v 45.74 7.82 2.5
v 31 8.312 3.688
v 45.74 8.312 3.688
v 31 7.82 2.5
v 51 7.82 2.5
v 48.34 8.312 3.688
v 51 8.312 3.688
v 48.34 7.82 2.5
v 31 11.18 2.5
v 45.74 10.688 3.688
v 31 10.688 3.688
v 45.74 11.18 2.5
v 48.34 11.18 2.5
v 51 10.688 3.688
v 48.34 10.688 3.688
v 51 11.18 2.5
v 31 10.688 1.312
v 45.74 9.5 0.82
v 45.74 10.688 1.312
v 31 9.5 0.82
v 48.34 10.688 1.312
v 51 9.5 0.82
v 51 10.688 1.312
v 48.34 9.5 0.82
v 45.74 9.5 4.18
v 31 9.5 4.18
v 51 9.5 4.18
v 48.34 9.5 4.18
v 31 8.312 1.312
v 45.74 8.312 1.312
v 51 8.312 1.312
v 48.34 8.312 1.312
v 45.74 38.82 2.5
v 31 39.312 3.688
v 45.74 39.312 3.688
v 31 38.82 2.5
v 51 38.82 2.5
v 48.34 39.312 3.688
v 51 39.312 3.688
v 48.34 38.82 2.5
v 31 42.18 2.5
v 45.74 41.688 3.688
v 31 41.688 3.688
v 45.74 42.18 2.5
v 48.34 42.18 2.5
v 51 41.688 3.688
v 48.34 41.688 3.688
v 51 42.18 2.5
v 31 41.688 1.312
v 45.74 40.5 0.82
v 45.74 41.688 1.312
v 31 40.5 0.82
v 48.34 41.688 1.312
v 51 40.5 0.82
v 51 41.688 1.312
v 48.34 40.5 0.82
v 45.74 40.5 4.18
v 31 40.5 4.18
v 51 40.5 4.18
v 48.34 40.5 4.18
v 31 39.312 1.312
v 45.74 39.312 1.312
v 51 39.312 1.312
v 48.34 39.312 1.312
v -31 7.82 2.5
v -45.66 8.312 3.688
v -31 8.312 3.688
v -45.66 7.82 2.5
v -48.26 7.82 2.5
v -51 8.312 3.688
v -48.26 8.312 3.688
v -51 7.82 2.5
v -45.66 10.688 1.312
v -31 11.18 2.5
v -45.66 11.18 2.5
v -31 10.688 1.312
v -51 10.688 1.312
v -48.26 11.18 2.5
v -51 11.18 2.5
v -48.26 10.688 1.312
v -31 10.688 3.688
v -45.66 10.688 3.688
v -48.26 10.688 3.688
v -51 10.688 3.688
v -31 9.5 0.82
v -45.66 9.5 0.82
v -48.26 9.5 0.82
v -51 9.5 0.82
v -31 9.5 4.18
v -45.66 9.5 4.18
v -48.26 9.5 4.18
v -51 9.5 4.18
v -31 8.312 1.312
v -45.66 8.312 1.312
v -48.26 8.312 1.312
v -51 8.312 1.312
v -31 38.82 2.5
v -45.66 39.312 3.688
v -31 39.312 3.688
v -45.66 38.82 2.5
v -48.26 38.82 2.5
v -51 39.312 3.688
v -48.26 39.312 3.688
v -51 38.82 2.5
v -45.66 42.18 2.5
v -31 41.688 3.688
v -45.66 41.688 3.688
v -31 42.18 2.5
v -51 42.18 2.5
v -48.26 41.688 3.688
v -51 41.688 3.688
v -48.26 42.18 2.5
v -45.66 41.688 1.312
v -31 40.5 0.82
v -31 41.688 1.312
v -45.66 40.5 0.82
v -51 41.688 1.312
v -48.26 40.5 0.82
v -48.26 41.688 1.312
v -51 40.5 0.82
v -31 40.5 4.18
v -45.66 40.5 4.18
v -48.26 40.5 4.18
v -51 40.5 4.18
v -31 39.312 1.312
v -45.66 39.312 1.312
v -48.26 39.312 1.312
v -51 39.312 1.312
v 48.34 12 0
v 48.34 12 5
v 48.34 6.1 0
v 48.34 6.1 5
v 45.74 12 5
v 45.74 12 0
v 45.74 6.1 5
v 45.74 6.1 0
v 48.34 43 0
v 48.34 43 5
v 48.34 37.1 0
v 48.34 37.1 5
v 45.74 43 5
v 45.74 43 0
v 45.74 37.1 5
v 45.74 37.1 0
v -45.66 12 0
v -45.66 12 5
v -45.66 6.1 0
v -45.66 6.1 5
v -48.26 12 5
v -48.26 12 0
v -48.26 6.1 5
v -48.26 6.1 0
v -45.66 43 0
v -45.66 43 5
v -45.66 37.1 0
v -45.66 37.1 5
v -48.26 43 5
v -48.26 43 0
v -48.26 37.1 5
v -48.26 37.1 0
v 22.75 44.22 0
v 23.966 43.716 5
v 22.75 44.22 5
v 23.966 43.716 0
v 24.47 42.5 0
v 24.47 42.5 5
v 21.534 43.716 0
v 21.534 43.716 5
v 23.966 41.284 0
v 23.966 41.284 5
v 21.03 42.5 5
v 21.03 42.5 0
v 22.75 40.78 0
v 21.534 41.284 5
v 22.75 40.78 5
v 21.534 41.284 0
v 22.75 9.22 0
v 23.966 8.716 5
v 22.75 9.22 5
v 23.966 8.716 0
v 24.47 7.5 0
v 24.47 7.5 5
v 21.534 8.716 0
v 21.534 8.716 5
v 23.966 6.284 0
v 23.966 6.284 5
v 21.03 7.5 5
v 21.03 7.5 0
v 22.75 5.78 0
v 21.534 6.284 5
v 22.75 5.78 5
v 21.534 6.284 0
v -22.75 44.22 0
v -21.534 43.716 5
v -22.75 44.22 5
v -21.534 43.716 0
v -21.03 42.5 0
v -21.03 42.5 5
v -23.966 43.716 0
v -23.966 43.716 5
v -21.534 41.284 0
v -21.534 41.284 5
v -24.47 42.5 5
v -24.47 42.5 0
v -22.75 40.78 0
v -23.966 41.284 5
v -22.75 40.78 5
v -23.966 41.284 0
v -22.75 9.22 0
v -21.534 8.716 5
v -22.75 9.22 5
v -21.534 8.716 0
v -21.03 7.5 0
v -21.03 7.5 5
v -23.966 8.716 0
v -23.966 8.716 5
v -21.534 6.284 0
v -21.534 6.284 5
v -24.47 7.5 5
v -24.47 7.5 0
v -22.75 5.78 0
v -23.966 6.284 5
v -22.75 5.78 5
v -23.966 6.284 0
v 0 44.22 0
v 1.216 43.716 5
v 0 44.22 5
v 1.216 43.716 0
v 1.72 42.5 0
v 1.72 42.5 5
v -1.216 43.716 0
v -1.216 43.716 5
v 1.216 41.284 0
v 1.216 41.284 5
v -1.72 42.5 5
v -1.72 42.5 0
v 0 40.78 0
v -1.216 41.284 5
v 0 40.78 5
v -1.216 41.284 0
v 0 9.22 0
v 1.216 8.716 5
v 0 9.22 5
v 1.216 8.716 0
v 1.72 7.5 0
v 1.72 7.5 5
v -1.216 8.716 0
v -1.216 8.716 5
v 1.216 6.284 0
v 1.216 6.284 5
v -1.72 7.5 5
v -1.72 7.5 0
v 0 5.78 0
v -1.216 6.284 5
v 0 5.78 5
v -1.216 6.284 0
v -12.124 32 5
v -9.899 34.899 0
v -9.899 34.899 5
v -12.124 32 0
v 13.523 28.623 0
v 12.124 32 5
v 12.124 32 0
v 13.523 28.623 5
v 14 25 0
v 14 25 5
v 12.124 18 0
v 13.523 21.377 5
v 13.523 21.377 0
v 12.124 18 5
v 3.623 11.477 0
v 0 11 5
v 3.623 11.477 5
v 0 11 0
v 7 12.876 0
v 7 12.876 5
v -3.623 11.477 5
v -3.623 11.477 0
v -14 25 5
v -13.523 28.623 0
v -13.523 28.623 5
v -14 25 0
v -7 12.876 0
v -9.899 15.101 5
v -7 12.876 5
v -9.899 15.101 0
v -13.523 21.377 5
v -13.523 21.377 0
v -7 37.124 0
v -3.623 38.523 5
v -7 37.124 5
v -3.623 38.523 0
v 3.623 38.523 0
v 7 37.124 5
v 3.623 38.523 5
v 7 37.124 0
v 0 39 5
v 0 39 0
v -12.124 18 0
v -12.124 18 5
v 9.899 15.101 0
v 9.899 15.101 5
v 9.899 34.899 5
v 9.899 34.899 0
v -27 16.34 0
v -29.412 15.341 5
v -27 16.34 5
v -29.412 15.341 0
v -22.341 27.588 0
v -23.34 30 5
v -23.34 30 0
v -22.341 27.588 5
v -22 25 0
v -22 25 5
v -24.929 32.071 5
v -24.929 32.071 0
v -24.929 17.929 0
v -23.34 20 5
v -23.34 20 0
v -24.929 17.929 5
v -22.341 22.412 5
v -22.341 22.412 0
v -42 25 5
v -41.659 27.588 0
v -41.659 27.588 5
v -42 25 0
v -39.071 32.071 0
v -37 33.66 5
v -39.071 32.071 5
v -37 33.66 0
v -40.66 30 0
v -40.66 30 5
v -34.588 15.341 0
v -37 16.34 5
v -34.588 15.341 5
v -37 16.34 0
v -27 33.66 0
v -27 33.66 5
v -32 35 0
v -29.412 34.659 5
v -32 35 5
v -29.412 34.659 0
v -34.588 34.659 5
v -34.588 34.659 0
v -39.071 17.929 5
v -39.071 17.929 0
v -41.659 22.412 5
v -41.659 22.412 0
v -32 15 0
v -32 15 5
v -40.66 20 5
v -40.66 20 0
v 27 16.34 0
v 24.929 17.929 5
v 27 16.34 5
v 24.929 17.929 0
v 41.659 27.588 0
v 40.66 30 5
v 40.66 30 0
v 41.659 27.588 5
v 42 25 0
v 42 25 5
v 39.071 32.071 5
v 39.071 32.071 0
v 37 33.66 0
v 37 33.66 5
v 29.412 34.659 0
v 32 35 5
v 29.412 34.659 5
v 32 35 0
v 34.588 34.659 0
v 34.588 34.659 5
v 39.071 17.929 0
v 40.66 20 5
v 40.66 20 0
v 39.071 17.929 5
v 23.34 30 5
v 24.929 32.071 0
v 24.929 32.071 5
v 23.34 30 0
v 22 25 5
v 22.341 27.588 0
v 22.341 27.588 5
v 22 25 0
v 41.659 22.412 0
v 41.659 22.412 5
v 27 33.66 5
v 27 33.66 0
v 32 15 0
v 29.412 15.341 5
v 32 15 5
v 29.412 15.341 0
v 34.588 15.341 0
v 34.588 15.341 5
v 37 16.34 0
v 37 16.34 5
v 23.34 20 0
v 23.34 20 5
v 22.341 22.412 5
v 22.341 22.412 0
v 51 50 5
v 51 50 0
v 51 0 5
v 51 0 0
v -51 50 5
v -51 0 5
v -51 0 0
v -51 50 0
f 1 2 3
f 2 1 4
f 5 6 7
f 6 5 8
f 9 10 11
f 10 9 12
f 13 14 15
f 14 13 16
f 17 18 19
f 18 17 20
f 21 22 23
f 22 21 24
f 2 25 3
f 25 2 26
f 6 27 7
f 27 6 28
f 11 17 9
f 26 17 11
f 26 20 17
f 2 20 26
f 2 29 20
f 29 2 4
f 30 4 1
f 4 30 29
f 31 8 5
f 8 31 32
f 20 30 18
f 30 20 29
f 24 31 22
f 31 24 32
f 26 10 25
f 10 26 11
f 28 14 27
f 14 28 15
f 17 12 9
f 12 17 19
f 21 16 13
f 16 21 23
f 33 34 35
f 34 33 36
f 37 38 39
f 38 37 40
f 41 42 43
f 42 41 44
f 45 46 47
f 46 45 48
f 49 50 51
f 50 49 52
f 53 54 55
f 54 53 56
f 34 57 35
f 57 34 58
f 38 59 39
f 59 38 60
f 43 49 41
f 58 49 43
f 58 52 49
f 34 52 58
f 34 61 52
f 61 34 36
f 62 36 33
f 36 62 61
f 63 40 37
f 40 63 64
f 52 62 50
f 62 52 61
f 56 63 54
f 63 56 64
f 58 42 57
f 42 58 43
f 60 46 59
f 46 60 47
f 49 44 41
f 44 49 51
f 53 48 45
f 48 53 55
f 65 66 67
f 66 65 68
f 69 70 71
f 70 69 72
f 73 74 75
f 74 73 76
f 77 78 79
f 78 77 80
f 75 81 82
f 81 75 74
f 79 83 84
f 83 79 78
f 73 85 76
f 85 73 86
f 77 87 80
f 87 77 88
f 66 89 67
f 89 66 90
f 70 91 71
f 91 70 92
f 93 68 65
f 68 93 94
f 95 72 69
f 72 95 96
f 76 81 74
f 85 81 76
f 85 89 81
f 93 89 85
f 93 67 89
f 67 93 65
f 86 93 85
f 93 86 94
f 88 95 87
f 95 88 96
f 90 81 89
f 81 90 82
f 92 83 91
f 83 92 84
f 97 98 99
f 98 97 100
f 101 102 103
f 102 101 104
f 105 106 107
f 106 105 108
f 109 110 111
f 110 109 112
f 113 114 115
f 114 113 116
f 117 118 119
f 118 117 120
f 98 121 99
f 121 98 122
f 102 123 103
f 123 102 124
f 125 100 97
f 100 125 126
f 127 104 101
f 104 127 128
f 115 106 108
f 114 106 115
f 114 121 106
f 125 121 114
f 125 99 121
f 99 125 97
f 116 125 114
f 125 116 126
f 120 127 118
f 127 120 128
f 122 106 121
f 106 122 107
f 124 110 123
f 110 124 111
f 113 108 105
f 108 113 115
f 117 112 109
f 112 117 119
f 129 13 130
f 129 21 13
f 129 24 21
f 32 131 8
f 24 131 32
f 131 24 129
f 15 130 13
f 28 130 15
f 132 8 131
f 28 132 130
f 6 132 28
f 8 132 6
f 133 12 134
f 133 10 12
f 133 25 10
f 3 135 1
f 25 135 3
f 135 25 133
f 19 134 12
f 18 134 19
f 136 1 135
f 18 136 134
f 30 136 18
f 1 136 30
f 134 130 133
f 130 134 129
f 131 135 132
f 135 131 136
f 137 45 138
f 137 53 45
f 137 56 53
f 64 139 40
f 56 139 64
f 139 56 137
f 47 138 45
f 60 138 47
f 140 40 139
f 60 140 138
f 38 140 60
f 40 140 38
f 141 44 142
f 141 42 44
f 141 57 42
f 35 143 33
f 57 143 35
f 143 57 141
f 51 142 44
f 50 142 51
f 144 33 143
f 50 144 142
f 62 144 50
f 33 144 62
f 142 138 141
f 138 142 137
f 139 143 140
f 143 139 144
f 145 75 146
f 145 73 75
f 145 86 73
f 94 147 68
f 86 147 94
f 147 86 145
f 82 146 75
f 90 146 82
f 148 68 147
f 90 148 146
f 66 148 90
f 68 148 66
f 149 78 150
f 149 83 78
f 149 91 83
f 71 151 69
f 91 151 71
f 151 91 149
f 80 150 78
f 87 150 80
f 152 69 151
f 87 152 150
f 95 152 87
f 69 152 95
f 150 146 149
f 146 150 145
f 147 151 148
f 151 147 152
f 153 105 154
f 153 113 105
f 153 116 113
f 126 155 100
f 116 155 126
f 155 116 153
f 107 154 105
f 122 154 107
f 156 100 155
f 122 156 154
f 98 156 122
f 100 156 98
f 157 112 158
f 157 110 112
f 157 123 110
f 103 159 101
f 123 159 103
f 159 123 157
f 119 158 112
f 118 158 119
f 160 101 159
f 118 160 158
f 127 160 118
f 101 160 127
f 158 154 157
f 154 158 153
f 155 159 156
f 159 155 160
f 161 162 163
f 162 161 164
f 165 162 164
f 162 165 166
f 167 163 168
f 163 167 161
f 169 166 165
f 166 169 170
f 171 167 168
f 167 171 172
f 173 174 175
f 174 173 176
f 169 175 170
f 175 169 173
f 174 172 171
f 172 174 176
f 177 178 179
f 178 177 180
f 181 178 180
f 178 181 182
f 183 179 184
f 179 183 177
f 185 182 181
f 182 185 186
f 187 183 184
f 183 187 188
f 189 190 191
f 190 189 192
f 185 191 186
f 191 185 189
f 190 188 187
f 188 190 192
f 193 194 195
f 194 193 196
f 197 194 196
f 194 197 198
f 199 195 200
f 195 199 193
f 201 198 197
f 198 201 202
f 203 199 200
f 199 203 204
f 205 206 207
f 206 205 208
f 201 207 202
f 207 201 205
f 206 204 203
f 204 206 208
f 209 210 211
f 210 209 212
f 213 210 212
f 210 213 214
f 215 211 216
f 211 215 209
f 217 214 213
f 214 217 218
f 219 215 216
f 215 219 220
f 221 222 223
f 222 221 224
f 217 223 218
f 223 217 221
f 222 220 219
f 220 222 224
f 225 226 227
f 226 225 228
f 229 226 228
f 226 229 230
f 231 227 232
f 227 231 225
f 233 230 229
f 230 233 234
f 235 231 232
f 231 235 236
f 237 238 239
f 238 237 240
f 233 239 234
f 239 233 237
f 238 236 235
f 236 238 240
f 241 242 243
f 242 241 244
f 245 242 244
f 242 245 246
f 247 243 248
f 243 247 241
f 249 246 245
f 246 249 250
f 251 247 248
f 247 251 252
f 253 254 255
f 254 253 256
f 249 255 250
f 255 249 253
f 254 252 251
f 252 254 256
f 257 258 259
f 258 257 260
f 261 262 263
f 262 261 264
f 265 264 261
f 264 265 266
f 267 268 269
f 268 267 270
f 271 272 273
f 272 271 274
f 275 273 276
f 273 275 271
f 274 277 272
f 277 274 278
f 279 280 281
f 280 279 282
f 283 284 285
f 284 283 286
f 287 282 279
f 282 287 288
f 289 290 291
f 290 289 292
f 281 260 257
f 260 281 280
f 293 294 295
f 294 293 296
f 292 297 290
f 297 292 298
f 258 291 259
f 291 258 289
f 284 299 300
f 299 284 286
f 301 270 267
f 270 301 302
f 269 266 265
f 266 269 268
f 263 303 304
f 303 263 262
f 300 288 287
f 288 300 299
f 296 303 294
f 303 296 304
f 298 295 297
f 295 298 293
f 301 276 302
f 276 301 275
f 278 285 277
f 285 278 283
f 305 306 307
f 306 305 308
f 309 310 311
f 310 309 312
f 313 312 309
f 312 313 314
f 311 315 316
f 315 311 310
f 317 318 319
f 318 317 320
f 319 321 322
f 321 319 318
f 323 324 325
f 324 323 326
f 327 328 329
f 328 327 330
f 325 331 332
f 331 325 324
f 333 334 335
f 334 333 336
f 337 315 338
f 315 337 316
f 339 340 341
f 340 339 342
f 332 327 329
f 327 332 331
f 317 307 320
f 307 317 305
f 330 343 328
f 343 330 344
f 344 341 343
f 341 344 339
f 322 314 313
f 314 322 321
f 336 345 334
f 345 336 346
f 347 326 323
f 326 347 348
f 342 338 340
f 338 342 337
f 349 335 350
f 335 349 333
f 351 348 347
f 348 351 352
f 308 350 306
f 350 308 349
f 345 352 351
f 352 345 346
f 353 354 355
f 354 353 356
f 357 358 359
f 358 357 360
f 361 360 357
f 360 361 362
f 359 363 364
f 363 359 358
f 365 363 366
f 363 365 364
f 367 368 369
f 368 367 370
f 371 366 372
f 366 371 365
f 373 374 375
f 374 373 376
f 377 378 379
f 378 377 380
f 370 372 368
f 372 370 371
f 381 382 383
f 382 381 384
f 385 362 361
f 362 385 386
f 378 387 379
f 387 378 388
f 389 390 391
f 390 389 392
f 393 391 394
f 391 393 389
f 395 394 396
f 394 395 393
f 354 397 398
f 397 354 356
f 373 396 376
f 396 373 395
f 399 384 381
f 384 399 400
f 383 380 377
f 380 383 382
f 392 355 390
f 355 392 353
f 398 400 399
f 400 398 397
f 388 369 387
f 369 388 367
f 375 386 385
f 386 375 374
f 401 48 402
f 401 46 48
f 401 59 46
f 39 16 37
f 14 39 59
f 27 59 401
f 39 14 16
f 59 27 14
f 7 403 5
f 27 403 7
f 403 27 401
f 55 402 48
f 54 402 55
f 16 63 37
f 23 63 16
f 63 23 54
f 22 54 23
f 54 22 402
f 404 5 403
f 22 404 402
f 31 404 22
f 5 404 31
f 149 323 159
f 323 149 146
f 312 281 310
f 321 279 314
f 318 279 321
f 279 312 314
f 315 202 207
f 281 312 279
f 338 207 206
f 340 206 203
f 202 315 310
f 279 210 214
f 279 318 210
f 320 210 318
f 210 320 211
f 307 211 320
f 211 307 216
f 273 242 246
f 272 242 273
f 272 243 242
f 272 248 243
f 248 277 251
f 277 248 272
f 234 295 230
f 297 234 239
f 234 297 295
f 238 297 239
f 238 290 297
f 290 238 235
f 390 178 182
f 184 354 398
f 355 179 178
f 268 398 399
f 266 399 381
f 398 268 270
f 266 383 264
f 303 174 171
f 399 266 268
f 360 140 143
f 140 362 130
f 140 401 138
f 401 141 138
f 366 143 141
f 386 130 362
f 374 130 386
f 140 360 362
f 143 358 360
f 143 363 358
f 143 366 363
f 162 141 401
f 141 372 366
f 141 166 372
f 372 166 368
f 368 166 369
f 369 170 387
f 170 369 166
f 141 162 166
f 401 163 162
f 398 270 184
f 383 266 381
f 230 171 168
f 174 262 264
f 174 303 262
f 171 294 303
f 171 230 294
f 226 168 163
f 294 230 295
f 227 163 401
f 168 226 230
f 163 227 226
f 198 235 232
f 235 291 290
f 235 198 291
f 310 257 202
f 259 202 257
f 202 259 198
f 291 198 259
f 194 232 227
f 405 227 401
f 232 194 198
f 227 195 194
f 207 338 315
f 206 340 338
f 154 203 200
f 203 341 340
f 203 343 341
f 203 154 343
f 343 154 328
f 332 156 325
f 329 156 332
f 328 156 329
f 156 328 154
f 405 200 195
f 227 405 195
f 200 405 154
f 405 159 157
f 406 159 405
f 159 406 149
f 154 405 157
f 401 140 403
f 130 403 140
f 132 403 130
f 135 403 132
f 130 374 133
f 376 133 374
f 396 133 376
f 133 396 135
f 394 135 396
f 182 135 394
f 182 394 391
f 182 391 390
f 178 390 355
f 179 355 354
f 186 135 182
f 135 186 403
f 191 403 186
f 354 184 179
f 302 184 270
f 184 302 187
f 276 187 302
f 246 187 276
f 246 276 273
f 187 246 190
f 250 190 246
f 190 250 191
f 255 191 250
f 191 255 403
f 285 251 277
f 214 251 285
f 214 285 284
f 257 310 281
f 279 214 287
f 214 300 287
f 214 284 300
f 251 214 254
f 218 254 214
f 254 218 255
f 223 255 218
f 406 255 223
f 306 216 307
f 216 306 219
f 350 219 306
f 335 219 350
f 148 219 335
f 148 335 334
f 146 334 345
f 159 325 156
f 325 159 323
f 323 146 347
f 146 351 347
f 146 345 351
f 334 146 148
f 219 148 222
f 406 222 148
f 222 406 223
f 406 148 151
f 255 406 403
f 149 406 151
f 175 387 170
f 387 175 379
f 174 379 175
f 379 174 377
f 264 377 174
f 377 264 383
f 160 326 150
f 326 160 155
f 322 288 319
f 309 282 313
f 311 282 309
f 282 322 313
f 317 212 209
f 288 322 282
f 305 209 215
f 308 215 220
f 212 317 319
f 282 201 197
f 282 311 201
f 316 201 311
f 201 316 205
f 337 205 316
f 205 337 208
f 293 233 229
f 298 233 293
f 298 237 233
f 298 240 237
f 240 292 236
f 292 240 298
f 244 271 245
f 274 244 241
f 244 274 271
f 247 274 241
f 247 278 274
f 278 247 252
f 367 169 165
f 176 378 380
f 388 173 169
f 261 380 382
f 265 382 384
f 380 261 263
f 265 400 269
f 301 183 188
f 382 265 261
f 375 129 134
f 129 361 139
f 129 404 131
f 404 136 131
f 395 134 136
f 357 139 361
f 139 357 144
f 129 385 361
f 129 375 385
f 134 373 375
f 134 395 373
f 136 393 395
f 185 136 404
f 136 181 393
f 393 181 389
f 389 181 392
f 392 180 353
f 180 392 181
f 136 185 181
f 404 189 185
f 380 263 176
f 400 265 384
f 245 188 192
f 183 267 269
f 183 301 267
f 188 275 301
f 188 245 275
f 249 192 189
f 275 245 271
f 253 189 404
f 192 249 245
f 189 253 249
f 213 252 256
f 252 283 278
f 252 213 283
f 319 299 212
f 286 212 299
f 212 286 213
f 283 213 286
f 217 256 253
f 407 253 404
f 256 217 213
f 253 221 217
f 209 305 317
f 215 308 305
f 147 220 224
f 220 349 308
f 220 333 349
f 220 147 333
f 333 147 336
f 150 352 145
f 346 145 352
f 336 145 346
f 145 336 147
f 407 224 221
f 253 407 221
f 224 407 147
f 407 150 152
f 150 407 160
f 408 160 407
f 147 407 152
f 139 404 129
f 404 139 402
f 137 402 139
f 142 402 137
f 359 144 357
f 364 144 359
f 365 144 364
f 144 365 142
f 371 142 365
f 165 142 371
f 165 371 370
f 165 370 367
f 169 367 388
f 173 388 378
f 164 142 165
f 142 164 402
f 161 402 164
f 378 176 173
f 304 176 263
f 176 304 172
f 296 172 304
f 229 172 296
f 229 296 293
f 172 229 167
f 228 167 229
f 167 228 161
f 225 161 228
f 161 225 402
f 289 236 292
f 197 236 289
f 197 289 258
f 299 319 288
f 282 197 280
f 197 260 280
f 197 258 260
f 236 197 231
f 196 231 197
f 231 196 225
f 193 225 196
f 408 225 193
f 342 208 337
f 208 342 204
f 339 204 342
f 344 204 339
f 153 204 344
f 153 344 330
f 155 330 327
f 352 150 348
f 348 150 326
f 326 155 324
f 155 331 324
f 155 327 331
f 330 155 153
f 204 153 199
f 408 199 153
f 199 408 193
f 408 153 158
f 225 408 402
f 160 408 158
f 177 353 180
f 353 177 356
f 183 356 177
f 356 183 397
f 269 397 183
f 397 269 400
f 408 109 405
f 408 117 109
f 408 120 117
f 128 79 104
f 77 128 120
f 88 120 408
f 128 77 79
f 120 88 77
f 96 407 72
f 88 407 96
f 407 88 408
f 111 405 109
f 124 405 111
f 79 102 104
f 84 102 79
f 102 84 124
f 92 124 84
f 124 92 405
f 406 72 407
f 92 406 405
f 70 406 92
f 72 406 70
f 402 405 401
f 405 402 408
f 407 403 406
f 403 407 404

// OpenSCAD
// file: dimensions.scad
// Originally created by Jose Julio
// https://github.com/JJulio/b-robot

SHARED_HEIGHT = 140;
SHARED_LENGTH = 102;
SHARED_WIDTH  = 50;
// main file
// Originally created by Jose Julio
// https://github.com/JJulio/b-robot

include <dimensions.scad>;

module support()
{
  translate([-(SHARED_LENGTH)/2,0,0]) cube([SHARED_LENGTH,SHARED_WIDTH,5]);

}

module support_holes()
{
  // M3 lateral holes
  translate([(SHARED_LENGTH)/2,9.5,5/2]) rotate([0,90,0]) cylinder(r=1.68,h=40,$fn=8,center=true);
  translate([(SHARED_LENGTH)/2,9.5+31,5/2]) rotate([0,90,0]) cylinder(r=1.68,h=40,$fn=8,center=true);
  translate([-(SHARED_LENGTH)/2,9.5,5/2]) rotate([0,90,0]) cylinder(r=1.68,h=40,$fn=8,center=true);
  translate([-(SHARED_LENGTH)/2,9.5+31,5/2]) rotate([0,90,0]) cylinder(r=1.68,h=40,$fn=8,center=true);

  // M3 NUT holes
  translate([(SHARED_LENGTH)/2-(4+1.26),9-2.9,-1]) cube([2.6,5.9,7]);
  translate([(SHARED_LENGTH)/2-(4+1.26),9+31-2.9,-1]) cube([2.6,5.9,7]);
  translate([-(SHARED_LENGTH)/2+(4-1.26),9-2.9,-1]) cube([2.6,5.9,7]);
  translate([-(SHARED_LENGTH)/2+(4-1.26),9+31-2.9,-1]) cube([2.6,5.9,7]);

  // Board mount holes
  translate([45.5/2,SHARED_WIDTH/2+35/2]) cylinder(r=1.72,h=20,$fn=8,center=true);
  translate([45.5/2,SHARED_WIDTH/2-35/2]) cylinder(r=1.72,h=20,$fn=8,center=true);
  translate([-45.5/2,SHARED_WIDTH/2+35/2]) cylinder(r=1.72,h=20,$fn=8,center=true);
  translate([-45.5/2,SHARED_WIDTH/2-35/2]) cylinder(r=1.72,h=20,$fn=8,center=true);
  // Aditional holes
  translate([0,SHARED_WIDTH/2+35/2]) cylinder(r=1.72,h=20,$fn=8,center=true);
  translate([0,SHARED_WIDTH/2-35/2]) cylinder(r=1.72,h=20,$fn=8,center=true);

  // Light holes
  translate([0,SHARED_WIDTH/2,0]) cylinder(r=14,h=20,$fn=24,center=true);
  translate([-32,SHARED_WIDTH/2,0]) cylinder(r=10,h=20,$fn=24,center=true);
  translate([32,SHARED_WIDTH/2,0]) cylinder(r=10,h=20,$fn=24,center=true);
}

difference()
{
support();
support_holes();
}
